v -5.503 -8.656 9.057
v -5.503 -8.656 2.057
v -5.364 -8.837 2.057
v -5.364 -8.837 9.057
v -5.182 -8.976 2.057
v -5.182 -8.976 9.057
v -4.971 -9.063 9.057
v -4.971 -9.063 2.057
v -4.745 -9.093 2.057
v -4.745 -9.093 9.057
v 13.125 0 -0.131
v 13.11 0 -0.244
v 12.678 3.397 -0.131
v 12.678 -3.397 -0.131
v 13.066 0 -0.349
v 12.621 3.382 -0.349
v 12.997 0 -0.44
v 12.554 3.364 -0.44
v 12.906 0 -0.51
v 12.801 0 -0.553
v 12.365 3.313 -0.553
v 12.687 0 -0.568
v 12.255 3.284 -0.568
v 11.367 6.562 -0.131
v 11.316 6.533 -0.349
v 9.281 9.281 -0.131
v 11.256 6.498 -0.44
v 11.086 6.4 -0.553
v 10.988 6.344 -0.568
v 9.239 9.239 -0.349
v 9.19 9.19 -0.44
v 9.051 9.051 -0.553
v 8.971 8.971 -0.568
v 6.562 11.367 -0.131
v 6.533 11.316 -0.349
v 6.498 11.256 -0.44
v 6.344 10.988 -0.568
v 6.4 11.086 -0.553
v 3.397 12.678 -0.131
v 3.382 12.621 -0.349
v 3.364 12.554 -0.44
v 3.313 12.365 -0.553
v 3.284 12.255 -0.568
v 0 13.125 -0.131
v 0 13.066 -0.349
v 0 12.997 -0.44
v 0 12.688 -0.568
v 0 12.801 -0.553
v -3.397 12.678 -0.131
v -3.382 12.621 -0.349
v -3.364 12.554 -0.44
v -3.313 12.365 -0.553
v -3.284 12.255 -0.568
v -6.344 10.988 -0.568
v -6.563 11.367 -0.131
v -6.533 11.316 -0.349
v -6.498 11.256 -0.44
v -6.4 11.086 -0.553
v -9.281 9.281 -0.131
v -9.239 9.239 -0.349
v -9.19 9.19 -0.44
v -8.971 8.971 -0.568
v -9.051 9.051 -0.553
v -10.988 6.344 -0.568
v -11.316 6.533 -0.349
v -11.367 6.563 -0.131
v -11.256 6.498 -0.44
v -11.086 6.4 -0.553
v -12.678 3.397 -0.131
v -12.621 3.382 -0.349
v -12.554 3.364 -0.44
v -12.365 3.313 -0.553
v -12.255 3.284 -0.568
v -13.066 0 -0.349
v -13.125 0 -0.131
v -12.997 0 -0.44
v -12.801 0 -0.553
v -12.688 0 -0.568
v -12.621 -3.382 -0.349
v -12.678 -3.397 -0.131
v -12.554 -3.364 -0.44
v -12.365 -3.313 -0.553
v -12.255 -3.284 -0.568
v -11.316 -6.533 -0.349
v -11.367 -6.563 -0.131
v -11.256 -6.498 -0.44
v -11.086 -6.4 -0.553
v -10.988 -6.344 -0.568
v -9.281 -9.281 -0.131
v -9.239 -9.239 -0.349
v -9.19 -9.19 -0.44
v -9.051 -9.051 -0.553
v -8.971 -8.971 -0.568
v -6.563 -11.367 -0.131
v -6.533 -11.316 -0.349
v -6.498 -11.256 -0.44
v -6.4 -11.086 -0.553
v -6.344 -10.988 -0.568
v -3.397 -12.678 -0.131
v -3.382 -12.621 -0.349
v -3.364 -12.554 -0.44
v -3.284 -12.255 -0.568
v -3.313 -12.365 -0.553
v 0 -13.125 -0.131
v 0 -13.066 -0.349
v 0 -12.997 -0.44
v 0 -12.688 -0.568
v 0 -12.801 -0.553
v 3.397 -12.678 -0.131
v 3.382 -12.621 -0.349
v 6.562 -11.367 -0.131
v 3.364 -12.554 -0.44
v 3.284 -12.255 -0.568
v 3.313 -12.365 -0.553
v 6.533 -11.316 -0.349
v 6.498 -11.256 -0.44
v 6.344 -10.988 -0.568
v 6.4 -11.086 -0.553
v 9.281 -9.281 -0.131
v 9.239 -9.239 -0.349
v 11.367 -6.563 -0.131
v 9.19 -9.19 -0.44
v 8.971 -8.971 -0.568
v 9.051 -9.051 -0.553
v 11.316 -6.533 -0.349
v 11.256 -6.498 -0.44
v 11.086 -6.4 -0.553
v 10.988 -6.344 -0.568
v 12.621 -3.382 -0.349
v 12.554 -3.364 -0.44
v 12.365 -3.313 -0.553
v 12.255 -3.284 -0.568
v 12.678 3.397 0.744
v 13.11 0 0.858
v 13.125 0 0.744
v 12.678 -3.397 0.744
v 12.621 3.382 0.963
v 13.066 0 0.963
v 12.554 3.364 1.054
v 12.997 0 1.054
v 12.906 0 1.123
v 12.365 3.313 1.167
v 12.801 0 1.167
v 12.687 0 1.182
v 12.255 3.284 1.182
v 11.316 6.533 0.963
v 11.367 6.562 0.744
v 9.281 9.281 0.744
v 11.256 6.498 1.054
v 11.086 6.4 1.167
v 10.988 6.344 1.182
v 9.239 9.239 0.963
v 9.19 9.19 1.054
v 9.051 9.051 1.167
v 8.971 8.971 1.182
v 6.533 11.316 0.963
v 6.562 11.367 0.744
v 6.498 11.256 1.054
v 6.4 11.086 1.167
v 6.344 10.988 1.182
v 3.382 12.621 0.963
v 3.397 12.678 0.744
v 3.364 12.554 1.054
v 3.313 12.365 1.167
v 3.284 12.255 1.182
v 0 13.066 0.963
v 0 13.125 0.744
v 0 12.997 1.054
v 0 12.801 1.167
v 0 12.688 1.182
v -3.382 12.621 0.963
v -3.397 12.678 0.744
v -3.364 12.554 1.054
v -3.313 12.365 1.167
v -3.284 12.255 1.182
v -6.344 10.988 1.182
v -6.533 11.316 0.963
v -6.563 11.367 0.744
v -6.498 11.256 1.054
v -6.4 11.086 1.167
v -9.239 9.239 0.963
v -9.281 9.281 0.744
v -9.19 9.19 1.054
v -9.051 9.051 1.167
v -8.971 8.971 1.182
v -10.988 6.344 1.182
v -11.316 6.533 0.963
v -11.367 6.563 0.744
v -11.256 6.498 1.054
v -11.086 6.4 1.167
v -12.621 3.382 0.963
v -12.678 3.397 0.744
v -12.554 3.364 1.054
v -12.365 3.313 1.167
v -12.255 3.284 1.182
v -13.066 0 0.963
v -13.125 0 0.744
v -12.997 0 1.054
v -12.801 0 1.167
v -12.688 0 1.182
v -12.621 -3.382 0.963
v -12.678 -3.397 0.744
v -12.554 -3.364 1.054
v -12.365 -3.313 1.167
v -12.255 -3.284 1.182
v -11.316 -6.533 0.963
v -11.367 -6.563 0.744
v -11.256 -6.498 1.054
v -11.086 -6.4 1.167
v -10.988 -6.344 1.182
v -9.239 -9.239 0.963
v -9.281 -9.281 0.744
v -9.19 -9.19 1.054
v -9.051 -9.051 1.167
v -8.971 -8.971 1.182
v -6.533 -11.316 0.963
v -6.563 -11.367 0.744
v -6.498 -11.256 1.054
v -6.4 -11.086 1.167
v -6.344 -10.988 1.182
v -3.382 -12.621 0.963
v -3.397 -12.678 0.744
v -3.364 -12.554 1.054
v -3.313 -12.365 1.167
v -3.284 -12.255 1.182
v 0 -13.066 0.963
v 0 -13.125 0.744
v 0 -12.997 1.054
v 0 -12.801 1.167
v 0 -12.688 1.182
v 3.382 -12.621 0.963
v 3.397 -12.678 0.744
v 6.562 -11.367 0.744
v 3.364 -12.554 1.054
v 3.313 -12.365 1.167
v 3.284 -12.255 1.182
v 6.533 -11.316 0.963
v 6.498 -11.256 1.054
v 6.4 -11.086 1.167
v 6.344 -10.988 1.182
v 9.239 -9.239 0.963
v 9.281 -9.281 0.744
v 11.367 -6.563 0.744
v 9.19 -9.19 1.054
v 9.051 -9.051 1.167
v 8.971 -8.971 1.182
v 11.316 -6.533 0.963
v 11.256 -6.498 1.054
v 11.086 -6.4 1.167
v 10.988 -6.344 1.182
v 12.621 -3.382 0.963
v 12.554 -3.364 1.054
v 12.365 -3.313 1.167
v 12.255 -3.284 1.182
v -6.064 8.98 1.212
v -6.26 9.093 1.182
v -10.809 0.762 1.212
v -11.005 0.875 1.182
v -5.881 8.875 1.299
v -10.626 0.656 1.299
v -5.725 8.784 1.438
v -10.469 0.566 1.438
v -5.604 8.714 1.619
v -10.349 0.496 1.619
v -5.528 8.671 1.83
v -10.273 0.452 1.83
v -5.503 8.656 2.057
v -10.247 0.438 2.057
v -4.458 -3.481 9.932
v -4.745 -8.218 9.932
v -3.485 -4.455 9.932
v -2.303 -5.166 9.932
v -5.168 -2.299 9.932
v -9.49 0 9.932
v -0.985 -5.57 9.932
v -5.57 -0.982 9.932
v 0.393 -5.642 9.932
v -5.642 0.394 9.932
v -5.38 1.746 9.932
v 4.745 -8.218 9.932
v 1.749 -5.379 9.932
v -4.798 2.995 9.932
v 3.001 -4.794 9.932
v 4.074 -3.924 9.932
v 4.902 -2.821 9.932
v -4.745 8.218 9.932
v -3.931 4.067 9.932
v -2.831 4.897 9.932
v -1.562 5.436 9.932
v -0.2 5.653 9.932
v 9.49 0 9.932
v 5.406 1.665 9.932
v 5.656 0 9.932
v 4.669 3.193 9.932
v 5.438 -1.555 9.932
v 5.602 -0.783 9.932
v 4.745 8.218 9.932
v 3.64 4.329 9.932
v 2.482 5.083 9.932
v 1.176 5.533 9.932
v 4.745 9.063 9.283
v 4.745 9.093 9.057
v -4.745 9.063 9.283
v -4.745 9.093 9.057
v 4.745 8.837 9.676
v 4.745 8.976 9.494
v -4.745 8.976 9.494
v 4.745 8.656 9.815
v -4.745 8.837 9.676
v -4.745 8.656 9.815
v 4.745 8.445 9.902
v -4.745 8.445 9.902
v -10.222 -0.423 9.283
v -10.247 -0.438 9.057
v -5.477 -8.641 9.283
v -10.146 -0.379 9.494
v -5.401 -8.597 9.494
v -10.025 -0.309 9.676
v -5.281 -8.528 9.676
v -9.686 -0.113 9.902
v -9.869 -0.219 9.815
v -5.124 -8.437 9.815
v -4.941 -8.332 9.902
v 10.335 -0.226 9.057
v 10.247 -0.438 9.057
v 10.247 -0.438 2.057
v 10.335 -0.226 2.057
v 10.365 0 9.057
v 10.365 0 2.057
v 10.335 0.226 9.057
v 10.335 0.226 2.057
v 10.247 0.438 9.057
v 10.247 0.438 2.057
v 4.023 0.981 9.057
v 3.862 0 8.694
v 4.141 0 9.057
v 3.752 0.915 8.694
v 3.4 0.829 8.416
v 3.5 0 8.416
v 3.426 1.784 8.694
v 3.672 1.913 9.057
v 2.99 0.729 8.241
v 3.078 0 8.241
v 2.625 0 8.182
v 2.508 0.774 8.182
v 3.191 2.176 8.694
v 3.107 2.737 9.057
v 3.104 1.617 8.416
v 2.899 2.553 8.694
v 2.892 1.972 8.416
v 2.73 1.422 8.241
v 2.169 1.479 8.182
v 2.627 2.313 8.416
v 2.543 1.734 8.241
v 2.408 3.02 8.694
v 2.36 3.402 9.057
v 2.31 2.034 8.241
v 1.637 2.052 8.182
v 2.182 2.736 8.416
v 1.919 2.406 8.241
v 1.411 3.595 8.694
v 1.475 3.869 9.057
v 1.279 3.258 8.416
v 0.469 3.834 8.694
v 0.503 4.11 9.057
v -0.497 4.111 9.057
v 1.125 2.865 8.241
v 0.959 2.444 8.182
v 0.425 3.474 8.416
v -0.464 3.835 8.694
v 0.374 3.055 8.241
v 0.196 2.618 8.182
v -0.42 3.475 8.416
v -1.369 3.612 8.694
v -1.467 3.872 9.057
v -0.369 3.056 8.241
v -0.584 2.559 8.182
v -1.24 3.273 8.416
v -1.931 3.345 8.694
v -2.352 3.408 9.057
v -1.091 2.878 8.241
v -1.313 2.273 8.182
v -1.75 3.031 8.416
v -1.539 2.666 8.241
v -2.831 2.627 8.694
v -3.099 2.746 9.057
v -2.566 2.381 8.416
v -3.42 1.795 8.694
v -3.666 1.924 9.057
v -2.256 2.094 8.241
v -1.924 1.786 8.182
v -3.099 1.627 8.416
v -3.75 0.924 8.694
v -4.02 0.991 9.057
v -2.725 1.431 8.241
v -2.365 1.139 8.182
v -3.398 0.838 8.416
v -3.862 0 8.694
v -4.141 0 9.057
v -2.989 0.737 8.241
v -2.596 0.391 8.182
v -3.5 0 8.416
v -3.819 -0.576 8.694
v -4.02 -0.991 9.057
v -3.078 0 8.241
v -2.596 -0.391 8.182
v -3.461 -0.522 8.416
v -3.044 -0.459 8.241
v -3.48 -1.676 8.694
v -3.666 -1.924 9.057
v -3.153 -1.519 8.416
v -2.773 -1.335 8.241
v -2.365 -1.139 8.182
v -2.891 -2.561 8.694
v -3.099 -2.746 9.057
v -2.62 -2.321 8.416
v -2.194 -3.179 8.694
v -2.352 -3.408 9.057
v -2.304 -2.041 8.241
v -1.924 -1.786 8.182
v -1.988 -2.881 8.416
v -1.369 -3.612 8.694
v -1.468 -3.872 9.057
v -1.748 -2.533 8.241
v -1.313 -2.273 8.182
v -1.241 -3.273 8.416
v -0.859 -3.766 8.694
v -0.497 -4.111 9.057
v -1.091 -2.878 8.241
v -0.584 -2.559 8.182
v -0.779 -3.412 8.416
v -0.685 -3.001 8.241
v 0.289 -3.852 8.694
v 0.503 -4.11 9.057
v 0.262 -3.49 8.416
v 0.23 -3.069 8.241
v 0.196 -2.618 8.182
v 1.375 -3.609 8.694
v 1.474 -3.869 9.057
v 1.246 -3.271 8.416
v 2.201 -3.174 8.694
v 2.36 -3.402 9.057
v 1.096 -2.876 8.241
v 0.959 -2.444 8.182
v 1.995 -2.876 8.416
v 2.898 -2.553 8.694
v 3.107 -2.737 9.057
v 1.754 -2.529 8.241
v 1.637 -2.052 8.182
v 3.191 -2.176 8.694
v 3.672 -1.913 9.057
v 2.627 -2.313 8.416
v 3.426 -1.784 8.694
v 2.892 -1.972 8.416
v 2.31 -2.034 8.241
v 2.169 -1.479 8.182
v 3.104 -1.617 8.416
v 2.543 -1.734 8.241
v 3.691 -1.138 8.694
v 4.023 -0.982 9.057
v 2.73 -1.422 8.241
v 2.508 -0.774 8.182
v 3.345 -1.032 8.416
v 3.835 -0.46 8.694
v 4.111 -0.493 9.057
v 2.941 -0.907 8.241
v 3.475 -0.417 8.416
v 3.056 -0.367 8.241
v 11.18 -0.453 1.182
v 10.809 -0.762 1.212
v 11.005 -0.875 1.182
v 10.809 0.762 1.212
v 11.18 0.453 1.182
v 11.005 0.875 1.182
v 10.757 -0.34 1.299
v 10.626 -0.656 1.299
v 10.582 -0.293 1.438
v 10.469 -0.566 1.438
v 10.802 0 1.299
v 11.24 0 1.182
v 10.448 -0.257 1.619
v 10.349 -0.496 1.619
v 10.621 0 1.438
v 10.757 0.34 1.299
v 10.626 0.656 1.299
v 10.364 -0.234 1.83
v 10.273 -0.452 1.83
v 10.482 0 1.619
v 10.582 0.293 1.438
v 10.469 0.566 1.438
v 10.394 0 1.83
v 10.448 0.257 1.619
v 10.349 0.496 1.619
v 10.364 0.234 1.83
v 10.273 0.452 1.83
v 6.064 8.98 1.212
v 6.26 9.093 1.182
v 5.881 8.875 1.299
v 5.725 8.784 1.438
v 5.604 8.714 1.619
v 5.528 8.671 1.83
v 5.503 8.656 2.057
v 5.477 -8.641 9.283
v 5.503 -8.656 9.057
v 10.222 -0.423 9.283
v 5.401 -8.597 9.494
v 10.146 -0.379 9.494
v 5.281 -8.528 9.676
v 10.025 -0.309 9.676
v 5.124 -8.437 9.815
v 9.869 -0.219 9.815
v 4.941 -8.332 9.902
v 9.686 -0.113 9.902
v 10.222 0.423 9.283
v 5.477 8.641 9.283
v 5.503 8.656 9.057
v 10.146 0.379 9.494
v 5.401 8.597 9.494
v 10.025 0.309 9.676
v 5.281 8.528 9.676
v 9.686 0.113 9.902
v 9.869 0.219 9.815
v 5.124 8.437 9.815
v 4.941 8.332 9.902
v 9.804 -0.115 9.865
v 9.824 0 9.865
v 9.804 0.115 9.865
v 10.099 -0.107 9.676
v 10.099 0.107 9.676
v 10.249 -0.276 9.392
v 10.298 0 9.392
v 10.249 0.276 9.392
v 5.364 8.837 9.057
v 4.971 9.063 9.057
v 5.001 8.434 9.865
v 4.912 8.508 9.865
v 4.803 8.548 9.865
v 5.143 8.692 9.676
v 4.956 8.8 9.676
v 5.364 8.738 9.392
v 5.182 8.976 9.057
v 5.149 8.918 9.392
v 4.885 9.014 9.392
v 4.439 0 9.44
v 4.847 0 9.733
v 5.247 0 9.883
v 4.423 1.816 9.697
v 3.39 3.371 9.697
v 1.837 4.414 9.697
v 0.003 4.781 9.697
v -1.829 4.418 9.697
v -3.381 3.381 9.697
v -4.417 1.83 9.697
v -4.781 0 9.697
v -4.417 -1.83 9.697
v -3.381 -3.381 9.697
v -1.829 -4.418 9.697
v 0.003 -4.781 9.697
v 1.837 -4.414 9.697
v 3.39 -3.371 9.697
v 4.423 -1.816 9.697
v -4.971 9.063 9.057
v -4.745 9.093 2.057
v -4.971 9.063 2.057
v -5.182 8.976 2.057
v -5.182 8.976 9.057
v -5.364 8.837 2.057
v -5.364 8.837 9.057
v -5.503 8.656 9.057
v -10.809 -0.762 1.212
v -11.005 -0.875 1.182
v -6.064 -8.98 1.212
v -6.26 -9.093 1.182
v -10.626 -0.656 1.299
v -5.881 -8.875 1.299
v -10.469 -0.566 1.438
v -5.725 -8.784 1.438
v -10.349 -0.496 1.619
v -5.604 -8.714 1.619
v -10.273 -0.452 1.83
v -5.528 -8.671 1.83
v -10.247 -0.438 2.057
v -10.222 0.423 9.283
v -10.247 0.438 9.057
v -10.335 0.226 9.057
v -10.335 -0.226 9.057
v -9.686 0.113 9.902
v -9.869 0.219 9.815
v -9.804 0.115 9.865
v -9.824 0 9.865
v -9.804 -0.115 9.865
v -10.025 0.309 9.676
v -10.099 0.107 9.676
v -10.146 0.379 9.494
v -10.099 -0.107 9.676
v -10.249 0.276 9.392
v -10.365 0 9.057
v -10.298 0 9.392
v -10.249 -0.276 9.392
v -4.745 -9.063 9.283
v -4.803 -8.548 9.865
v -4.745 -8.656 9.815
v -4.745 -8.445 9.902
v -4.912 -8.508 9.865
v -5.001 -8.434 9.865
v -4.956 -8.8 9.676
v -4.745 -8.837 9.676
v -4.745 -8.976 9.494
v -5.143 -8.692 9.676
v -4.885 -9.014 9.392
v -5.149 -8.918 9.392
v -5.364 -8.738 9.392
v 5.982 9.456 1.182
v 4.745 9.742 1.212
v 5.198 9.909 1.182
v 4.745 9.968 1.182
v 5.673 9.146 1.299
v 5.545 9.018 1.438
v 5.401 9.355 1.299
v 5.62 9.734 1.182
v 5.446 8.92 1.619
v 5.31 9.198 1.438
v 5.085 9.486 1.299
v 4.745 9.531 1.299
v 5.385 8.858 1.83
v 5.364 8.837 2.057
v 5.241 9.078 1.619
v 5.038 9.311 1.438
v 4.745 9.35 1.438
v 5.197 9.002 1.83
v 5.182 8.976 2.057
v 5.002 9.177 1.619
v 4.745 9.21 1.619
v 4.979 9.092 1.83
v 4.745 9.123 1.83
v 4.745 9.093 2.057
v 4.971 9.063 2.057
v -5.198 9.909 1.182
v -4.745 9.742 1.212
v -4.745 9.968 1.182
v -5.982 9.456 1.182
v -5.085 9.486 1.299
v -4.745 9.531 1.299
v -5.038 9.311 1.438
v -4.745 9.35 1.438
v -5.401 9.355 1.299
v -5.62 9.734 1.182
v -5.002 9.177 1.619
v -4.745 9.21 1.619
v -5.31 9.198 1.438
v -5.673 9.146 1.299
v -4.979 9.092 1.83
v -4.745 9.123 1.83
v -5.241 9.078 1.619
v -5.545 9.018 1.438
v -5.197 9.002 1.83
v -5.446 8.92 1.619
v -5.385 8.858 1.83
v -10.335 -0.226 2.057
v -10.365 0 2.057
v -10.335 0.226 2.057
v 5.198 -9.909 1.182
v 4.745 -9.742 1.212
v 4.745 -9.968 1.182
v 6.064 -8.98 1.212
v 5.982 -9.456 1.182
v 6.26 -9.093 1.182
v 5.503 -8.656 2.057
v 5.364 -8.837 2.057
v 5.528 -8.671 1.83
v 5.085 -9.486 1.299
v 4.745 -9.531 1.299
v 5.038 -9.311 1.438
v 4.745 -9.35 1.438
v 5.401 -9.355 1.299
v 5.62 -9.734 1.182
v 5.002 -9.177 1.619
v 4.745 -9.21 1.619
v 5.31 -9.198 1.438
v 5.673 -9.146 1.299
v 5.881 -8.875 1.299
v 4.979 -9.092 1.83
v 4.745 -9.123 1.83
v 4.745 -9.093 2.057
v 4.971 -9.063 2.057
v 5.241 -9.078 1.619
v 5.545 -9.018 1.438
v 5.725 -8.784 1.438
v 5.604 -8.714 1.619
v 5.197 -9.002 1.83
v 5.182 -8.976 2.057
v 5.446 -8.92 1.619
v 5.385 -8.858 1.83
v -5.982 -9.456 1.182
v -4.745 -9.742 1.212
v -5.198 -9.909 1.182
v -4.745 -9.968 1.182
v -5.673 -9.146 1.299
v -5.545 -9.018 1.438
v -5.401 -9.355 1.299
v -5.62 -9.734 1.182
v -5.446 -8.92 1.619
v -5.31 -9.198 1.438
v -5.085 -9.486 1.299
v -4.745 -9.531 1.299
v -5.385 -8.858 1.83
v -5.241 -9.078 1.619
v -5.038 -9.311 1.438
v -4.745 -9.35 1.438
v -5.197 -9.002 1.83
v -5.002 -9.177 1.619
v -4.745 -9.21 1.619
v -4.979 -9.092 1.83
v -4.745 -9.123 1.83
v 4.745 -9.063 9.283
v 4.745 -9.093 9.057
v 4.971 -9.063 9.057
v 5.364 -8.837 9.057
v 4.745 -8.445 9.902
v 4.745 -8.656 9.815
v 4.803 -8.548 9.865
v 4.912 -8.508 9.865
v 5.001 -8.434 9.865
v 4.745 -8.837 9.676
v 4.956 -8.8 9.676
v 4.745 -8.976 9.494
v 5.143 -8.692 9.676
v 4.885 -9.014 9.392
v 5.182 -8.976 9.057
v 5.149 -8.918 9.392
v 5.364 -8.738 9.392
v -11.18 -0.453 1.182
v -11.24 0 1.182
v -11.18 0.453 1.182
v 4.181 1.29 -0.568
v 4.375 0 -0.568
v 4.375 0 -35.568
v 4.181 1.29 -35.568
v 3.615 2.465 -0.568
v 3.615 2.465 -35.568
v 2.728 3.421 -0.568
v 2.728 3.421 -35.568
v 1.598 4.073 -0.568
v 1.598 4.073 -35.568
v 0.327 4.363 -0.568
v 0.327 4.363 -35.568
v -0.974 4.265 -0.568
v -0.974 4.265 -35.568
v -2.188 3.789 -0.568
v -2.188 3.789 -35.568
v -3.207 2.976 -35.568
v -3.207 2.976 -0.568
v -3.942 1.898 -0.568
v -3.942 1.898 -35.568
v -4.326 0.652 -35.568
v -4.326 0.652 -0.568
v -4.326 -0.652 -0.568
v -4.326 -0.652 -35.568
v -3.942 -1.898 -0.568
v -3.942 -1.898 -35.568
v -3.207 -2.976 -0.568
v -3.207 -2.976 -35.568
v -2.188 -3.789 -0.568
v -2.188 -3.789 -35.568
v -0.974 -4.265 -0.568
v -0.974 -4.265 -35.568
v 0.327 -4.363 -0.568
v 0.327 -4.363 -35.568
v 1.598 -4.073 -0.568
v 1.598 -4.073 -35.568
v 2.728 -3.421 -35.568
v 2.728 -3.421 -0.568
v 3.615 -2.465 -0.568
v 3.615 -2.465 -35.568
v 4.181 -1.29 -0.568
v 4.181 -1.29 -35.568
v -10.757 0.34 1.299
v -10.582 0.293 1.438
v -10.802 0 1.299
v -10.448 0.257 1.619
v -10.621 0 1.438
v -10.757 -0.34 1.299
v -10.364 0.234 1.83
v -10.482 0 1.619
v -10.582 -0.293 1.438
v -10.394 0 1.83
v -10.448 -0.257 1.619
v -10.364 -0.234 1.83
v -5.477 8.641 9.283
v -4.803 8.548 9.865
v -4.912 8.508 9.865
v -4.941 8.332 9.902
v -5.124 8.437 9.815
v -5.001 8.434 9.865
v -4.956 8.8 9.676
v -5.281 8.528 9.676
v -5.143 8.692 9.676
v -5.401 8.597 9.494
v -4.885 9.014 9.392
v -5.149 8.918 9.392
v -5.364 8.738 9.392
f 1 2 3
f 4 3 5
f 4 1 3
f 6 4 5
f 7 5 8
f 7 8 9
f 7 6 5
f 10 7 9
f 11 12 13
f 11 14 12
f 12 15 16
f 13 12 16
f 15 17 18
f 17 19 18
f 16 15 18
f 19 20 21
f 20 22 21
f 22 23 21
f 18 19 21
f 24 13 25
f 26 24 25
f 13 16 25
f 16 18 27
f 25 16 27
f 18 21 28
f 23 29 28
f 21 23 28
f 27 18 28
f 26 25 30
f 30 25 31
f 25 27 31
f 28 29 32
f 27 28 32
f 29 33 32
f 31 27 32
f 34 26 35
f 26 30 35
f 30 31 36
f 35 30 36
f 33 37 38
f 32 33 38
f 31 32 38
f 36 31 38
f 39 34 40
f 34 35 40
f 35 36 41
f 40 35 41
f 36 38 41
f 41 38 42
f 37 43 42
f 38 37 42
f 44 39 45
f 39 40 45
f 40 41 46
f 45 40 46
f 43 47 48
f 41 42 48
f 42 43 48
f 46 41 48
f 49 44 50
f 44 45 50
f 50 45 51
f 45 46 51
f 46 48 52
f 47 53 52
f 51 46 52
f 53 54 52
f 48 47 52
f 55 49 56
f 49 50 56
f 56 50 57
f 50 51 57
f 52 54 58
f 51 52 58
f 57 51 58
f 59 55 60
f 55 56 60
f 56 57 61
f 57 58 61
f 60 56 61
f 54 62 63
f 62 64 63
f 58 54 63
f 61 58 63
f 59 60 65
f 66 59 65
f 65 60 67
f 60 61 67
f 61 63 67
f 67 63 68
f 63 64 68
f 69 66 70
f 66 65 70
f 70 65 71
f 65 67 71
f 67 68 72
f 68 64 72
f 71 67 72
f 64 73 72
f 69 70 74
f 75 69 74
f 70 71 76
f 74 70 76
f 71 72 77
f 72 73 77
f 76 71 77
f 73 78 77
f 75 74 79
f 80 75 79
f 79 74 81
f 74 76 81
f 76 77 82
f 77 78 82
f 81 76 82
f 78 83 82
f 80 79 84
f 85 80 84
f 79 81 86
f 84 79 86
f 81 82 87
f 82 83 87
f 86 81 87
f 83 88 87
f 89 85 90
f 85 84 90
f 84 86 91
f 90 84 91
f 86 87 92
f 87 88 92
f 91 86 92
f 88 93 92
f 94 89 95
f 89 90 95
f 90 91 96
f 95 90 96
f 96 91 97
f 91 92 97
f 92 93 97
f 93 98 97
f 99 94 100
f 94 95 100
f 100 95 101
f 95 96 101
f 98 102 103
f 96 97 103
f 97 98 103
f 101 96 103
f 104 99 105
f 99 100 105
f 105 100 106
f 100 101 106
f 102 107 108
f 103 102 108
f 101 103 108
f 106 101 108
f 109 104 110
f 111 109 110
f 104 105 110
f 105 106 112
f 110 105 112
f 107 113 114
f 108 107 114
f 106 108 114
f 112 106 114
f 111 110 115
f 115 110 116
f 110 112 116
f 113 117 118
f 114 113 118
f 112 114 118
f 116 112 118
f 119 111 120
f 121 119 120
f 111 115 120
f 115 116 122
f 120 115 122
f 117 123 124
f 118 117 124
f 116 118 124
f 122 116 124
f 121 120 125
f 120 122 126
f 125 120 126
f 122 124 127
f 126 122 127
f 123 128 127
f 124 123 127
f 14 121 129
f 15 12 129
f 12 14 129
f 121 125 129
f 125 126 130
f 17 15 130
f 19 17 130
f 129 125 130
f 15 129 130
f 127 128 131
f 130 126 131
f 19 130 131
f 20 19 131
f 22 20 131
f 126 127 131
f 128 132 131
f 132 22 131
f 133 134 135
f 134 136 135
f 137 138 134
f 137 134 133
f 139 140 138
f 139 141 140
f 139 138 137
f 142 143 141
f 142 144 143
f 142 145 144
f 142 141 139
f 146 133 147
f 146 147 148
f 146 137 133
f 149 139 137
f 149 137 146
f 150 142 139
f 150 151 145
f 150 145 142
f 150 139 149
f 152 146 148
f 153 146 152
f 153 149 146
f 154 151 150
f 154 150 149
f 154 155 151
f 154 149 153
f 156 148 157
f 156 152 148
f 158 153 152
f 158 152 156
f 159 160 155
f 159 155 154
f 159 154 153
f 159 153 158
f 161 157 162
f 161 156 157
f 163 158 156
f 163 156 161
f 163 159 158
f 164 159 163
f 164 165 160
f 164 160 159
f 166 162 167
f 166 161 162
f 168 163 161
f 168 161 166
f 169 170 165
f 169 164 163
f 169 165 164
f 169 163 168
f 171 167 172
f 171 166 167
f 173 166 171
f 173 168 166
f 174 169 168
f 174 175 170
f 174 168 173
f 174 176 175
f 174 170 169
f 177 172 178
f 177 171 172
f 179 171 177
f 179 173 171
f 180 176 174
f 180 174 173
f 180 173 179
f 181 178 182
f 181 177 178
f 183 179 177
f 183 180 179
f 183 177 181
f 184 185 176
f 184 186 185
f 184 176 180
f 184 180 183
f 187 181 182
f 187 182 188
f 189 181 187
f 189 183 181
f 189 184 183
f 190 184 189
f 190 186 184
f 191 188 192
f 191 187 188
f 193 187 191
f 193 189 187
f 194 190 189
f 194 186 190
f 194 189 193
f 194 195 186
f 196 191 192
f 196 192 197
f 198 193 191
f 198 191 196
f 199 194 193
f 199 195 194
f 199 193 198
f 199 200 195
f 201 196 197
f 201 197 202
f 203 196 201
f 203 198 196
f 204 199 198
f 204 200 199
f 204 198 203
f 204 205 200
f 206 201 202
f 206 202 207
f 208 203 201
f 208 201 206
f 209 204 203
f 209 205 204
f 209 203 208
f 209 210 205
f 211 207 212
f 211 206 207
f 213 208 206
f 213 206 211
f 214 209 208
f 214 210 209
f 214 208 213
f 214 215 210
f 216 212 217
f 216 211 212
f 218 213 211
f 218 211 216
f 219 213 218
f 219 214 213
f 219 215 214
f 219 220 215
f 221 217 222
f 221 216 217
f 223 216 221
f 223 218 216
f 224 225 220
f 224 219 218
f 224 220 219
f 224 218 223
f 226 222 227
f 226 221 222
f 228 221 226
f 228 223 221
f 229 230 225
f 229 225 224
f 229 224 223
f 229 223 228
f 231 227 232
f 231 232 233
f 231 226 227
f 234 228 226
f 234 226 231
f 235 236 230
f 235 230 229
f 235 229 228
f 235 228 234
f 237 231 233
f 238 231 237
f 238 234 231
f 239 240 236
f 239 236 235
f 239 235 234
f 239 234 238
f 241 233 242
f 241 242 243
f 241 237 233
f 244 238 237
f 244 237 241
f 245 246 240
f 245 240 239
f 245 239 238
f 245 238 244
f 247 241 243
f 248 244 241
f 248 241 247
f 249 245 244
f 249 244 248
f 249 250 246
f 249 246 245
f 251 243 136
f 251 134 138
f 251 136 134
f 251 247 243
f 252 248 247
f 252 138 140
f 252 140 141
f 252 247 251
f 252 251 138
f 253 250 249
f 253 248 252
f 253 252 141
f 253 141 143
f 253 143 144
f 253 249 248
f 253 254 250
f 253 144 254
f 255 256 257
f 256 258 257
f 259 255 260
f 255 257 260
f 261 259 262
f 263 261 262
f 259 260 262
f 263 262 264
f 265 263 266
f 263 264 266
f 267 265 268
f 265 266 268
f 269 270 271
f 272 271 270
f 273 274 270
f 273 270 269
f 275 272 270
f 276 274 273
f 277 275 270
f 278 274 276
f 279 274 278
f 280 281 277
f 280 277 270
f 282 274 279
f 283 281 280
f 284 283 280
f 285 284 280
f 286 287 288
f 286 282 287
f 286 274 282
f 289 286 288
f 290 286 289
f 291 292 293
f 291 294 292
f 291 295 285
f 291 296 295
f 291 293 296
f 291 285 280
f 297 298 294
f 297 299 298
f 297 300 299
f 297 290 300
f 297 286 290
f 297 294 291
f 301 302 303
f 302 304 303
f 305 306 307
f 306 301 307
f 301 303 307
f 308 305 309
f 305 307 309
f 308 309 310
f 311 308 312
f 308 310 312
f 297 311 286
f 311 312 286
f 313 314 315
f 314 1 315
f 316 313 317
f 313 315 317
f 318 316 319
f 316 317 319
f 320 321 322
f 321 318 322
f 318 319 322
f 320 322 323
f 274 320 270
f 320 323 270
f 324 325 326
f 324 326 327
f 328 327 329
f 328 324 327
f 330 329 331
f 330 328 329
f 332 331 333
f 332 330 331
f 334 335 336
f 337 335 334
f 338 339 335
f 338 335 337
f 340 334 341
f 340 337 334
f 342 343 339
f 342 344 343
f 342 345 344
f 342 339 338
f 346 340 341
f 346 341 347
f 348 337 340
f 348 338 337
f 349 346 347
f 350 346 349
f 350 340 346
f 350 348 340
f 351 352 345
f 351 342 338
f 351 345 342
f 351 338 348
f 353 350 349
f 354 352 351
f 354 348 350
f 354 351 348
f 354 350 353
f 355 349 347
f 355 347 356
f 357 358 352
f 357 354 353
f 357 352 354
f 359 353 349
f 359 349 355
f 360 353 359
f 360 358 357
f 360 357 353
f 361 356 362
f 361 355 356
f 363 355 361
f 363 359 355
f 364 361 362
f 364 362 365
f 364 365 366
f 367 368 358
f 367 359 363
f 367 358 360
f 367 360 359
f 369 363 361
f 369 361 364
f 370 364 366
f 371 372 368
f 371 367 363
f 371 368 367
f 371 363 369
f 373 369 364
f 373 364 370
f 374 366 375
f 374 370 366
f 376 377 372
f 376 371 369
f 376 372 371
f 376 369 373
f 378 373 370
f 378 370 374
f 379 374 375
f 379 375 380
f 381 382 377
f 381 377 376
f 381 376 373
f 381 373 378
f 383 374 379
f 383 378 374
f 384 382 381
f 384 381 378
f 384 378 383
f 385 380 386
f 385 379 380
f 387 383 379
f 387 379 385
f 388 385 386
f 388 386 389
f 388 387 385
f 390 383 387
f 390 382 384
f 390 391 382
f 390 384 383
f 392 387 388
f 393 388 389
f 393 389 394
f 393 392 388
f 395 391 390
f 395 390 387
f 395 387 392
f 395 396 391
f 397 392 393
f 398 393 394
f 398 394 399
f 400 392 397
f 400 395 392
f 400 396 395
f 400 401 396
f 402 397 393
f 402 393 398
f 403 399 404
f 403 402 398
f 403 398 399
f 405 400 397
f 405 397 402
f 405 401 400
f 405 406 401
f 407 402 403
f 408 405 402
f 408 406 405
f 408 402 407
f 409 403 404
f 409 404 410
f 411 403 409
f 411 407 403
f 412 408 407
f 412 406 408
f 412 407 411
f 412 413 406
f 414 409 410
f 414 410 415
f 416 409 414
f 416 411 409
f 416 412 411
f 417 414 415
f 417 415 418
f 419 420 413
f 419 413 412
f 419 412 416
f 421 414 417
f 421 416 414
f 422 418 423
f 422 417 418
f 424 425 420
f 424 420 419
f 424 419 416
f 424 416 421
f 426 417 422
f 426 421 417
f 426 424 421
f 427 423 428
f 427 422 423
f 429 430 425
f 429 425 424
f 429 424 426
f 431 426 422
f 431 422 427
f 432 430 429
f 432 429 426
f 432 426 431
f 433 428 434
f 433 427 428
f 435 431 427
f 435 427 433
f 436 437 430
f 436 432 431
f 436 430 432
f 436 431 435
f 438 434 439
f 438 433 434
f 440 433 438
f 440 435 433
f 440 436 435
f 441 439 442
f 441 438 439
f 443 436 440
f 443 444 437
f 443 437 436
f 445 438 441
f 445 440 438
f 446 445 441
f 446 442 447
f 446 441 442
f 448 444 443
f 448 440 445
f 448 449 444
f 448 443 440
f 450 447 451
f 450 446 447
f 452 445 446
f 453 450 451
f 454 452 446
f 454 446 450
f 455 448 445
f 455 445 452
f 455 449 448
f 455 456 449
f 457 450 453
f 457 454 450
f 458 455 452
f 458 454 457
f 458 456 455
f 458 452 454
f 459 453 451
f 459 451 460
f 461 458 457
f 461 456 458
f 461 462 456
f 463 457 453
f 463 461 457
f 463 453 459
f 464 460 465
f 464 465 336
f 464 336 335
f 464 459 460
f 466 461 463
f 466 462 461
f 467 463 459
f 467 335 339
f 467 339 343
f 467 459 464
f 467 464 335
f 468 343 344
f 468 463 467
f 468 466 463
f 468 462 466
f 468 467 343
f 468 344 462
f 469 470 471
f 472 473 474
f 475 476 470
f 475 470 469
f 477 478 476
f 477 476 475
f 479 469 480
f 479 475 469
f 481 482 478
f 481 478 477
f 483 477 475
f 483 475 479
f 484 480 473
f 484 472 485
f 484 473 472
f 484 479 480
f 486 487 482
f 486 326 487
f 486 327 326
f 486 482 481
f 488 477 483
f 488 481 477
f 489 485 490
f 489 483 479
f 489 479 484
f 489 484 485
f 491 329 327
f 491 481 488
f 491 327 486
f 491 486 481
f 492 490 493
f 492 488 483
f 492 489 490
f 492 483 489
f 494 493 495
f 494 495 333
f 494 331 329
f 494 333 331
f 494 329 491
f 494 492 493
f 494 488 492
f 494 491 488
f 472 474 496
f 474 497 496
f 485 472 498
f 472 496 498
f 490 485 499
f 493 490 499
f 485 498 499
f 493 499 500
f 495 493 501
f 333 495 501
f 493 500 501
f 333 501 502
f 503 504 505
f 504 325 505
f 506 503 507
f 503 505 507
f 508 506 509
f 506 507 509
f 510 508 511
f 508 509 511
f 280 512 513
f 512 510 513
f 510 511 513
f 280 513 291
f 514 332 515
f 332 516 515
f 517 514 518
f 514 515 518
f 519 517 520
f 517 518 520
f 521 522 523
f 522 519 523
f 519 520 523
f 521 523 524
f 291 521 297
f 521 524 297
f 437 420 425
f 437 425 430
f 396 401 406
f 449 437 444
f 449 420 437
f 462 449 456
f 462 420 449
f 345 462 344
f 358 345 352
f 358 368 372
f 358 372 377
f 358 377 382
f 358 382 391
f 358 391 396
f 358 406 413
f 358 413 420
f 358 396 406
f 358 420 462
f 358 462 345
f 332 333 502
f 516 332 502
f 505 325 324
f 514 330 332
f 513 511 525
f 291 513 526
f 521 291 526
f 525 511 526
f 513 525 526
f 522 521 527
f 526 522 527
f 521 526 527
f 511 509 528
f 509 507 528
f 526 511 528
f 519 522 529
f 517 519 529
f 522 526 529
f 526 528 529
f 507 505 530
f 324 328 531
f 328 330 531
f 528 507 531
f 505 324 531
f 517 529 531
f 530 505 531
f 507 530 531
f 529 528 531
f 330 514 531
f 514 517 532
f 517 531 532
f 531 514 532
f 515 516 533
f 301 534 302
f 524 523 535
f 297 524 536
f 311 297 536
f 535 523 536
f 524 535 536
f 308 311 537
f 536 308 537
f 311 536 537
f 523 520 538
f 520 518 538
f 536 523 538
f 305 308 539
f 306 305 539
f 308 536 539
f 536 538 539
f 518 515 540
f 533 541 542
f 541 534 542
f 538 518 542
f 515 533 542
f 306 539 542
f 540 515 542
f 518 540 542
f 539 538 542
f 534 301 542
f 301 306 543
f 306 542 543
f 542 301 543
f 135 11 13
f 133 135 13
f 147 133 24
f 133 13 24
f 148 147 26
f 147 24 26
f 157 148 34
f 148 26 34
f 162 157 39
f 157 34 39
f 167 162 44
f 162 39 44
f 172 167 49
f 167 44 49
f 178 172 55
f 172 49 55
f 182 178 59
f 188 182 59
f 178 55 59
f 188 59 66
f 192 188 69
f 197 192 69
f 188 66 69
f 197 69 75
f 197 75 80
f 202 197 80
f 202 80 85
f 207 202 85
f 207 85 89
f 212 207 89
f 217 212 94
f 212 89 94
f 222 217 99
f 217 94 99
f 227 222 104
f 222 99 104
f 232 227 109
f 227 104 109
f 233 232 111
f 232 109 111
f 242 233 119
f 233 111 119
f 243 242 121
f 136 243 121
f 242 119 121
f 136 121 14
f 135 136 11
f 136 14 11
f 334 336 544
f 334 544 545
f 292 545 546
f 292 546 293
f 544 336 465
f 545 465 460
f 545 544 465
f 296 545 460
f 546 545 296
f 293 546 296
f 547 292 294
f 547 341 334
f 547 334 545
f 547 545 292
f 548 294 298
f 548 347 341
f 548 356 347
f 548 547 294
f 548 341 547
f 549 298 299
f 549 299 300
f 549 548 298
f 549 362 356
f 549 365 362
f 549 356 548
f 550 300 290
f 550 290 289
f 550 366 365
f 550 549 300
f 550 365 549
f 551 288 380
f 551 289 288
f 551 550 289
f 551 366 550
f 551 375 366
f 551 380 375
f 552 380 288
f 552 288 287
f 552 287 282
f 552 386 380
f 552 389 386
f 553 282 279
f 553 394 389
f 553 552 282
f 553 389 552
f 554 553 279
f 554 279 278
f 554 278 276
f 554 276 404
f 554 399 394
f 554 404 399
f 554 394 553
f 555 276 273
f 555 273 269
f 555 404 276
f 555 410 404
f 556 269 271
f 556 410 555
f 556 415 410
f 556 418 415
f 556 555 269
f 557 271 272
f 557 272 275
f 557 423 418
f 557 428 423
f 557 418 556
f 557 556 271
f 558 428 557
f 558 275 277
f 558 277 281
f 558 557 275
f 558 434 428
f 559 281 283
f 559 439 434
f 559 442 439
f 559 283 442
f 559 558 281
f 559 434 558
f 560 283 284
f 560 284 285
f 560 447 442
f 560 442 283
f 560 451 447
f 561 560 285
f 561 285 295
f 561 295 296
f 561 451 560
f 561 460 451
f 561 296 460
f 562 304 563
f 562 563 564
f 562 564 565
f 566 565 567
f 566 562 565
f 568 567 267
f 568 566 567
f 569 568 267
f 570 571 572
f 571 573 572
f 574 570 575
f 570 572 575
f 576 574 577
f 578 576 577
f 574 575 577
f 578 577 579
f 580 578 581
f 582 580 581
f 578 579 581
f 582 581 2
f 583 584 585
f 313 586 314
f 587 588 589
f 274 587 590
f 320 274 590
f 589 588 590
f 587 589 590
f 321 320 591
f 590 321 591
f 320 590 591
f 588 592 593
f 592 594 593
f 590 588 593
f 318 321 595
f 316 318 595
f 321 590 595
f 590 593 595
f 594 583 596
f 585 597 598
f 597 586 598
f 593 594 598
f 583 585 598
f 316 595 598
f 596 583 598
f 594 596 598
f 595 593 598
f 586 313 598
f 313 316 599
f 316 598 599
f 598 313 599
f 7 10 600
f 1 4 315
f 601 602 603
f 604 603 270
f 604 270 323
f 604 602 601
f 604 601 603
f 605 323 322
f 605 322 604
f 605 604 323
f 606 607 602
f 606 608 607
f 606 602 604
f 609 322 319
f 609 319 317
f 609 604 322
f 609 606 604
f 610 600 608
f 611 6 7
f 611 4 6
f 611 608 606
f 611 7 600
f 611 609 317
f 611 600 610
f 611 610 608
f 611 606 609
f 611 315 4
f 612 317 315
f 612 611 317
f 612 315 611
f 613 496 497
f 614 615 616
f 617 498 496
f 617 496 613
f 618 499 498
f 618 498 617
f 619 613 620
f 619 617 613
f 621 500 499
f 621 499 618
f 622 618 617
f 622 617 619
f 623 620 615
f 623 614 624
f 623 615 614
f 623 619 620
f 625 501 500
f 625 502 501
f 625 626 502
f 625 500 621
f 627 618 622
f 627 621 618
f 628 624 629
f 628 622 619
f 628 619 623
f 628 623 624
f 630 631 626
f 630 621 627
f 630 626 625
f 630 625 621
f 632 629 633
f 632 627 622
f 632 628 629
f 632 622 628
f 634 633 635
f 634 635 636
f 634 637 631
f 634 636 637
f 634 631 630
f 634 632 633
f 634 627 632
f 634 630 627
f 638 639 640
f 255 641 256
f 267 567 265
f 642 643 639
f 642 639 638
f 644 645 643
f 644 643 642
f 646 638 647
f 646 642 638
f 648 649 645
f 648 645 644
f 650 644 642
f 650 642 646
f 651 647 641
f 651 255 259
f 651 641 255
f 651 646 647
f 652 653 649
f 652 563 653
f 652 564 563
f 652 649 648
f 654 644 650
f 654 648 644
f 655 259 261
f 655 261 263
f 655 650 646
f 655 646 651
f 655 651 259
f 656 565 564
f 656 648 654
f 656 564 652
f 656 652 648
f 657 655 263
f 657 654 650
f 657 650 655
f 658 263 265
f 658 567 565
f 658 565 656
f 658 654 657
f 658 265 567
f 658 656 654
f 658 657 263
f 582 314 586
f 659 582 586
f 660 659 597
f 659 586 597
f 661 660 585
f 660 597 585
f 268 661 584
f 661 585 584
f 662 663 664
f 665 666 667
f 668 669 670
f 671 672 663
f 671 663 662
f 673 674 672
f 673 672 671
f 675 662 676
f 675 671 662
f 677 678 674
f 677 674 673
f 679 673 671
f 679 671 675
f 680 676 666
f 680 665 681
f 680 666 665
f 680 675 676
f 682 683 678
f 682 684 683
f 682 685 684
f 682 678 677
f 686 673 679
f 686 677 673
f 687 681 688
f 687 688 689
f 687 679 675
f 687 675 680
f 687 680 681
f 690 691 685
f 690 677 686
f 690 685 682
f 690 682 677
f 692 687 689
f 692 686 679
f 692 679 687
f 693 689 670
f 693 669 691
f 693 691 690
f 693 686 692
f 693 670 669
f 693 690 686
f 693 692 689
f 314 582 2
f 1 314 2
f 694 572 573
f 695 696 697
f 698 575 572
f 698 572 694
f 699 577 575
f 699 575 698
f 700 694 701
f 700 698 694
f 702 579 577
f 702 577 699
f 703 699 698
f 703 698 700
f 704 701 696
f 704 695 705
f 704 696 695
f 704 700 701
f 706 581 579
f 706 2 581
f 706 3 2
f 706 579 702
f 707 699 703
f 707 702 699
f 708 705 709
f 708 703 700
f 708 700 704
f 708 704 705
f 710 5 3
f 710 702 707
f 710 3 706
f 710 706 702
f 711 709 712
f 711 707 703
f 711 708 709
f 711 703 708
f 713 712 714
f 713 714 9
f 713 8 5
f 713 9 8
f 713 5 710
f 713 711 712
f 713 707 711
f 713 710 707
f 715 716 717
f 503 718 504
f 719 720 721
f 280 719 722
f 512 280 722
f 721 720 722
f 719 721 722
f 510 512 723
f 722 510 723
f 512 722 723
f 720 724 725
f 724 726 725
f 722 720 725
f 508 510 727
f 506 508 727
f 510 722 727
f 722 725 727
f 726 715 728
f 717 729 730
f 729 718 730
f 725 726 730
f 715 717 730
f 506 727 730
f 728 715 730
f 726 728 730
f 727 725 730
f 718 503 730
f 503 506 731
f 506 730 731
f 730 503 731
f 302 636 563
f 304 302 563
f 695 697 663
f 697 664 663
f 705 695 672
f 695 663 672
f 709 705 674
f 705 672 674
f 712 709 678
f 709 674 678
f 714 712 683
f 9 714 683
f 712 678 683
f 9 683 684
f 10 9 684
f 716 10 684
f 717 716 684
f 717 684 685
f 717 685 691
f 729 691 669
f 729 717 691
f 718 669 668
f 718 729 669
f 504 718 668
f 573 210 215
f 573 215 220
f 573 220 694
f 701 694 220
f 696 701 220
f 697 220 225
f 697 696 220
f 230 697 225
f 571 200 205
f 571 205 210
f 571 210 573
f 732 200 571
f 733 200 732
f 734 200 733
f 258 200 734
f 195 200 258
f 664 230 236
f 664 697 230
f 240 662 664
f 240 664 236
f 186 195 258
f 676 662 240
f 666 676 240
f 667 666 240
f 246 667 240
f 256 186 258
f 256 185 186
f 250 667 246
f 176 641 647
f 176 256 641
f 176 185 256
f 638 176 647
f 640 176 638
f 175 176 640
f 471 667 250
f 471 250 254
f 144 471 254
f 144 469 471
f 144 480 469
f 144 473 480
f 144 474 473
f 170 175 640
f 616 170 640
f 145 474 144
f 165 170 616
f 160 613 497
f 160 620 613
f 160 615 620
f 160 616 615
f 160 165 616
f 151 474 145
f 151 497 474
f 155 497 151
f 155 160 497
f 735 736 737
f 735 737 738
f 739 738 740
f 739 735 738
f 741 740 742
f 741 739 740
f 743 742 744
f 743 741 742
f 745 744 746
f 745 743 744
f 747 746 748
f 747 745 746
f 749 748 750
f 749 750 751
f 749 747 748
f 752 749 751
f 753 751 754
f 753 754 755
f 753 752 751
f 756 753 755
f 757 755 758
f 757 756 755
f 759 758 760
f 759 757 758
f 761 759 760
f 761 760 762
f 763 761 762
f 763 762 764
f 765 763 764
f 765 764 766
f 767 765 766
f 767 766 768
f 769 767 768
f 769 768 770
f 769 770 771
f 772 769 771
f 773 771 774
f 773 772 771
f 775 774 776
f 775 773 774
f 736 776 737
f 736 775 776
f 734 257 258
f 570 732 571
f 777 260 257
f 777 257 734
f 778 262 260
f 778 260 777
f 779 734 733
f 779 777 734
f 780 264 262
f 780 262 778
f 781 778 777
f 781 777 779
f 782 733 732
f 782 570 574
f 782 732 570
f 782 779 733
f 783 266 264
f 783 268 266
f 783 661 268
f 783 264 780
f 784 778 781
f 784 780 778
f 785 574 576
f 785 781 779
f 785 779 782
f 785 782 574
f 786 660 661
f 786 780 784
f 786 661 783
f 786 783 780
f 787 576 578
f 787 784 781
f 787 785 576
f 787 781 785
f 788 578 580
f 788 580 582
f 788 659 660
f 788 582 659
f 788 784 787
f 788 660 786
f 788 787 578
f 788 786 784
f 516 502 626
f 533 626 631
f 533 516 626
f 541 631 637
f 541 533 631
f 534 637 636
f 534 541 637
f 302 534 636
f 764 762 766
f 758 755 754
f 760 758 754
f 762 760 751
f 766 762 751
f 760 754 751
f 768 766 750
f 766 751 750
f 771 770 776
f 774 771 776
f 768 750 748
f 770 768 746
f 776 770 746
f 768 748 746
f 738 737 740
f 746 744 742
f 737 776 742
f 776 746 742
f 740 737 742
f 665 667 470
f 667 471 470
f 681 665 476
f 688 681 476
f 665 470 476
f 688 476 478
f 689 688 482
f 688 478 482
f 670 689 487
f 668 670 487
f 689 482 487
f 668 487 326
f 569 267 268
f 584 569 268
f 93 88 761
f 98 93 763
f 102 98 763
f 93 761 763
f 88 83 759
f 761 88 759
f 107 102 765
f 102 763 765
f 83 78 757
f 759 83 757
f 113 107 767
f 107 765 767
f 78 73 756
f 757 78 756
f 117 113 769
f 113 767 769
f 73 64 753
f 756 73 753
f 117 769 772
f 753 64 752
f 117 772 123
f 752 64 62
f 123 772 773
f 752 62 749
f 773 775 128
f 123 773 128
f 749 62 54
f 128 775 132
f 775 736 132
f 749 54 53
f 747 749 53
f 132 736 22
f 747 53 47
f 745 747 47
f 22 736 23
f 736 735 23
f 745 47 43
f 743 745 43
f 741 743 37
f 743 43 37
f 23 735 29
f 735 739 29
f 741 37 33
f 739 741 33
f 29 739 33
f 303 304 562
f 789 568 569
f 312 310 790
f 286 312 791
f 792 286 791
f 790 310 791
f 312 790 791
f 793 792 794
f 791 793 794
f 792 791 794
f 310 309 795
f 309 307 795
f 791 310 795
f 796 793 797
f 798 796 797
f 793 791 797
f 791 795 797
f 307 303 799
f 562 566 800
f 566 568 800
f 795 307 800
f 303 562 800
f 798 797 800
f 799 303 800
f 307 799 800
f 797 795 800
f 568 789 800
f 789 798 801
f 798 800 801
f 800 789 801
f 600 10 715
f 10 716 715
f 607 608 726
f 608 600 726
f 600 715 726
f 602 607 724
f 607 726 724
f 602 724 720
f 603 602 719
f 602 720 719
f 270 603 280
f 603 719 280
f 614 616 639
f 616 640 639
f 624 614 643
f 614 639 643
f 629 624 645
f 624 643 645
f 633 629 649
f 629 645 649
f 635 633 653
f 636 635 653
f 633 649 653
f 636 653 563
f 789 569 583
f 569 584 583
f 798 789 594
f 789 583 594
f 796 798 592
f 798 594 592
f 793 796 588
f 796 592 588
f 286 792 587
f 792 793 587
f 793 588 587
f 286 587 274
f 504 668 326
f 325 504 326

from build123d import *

# Parameters (mm, degrees)
SKETCH1_R           = 5
BOSS_EXTRUDE1_DEPTH = 40
SKETCH1_3_R         = 15
BOSS_EXTRUDE2_DEPTH = 2
BOSS_EXTRUDE3_DEPTH = 10
CUT_EXTRUDE1_START  = 10
SKETCH2_3_R         = 5
CUT_EXTRUDE1_DEPTH  = 2
FILLET1_R           = 0.5
FILLET2_R           = 1
FILLET3_R           = 2
FILLET4_R           = 2
SCALE1_SCALE        = 0.875


with BuildPart() as part:
    # Sketch1 → Boss-Extrude1 (new body)
    with BuildSketch(Plane(origin=(0, 0, 0), x_dir=(0, 1, 0), z_dir=(0, 0, 1))):
        with Locations(Location((0, 0, 0), (0, 0, 270))):
            Circle(SKETCH1_R)
    extrude(amount=-BOSS_EXTRUDE1_DEPTH)

    # Sketch1<3> → Boss-Extrude2 (add)
    with BuildSketch(Plane(origin=(0, 0, 0), x_dir=(0, 1, 0), z_dir=(0, 0, 1))):
        with Locations(Location((0, 0, 0), (0, 0, 270))):
            Circle(SKETCH1_3_R)
    extrude(amount=BOSS_EXTRUDE2_DEPTH)

    # Sketch2 → Boss-Extrude3 (add)
    with BuildSketch(Plane.XY.offset(2)):
        Polygon((-12, 0), (-6, -10.392304845), (6, -10.392304845), (12, 0), (6, 10.392304845), (-6, 10.392304845), align=None)
    extrude(amount=BOSS_EXTRUDE3_DEPTH)

    # Sketch2<3> → Cut-Extrude1 (cut)
    with BuildSketch(Plane.XY.offset(2).offset(CUT_EXTRUDE1_START)):
        Circle(SKETCH2_3_R)
    extrude(amount=-CUT_EXTRUDE1_DEPTH, mode=Mode.SUBTRACT)

    # Fillet1
    fillet1_edges = [part.edges().sort_by_distance(p)[0] for p in [
        (-15, 0, 0),
        (-15, 0, 2),
    ]]
    fillet(fillet1_edges, radius=FILLET1_R)

    # Fillet2
    fillet2_edges = [part.edges().sort_by_distance(p)[0] for p in [
        (0, -10.392304845, 2),
        (-6, -10.392304845, 7),
        (9, -5.196152423, 2),
        (6, -10.392304845, 7),
        (9, 5.196152423, 2),
        (12, 0, 7),
        (0, 10.392304845, 2),
        (6, 10.392304845, 7),
        (-9, 5.196152423, 2),
        (-6, 10.392304845, 7),
        (-9, -5.196152423, 2),
        (-12, 0, 7),
        (0, -10.392304845, 12),
        (9, -5.196152423, 12),
        (9, 5.196152423, 12),
        (0, 10.392304845, 12),
        (-9, 5.196152423, 12),
        (-9, -5.196152423, 12),
    ]]
    fillet(fillet2_edges, radius=FILLET2_R)

    # Fillet3
    fillet3_edges = [part.edges().sort_by_distance(p)[0] for p in [
        (-5, 0, 10),
    ]]
    fillet(fillet3_edges, radius=FILLET3_R - 0.0001)  # a hair under: the kernel refuses the full size

    # Fillet4
    fillet4_edges = [part.edges().sort_by_distance(p)[0] for p in [
        (-5, 0, 12),
    ]]
    fillet(fillet4_edges, radius=FILLET4_R)


with BuildPart() as part_1:
    # Scale1: scaled about (-9e-09, 0, -4.545352594)
    add(part.part.scale(SCALE1_SCALE).moved(Location((-1e-09, 0, -0.568169074))))


solid = part_1.part
